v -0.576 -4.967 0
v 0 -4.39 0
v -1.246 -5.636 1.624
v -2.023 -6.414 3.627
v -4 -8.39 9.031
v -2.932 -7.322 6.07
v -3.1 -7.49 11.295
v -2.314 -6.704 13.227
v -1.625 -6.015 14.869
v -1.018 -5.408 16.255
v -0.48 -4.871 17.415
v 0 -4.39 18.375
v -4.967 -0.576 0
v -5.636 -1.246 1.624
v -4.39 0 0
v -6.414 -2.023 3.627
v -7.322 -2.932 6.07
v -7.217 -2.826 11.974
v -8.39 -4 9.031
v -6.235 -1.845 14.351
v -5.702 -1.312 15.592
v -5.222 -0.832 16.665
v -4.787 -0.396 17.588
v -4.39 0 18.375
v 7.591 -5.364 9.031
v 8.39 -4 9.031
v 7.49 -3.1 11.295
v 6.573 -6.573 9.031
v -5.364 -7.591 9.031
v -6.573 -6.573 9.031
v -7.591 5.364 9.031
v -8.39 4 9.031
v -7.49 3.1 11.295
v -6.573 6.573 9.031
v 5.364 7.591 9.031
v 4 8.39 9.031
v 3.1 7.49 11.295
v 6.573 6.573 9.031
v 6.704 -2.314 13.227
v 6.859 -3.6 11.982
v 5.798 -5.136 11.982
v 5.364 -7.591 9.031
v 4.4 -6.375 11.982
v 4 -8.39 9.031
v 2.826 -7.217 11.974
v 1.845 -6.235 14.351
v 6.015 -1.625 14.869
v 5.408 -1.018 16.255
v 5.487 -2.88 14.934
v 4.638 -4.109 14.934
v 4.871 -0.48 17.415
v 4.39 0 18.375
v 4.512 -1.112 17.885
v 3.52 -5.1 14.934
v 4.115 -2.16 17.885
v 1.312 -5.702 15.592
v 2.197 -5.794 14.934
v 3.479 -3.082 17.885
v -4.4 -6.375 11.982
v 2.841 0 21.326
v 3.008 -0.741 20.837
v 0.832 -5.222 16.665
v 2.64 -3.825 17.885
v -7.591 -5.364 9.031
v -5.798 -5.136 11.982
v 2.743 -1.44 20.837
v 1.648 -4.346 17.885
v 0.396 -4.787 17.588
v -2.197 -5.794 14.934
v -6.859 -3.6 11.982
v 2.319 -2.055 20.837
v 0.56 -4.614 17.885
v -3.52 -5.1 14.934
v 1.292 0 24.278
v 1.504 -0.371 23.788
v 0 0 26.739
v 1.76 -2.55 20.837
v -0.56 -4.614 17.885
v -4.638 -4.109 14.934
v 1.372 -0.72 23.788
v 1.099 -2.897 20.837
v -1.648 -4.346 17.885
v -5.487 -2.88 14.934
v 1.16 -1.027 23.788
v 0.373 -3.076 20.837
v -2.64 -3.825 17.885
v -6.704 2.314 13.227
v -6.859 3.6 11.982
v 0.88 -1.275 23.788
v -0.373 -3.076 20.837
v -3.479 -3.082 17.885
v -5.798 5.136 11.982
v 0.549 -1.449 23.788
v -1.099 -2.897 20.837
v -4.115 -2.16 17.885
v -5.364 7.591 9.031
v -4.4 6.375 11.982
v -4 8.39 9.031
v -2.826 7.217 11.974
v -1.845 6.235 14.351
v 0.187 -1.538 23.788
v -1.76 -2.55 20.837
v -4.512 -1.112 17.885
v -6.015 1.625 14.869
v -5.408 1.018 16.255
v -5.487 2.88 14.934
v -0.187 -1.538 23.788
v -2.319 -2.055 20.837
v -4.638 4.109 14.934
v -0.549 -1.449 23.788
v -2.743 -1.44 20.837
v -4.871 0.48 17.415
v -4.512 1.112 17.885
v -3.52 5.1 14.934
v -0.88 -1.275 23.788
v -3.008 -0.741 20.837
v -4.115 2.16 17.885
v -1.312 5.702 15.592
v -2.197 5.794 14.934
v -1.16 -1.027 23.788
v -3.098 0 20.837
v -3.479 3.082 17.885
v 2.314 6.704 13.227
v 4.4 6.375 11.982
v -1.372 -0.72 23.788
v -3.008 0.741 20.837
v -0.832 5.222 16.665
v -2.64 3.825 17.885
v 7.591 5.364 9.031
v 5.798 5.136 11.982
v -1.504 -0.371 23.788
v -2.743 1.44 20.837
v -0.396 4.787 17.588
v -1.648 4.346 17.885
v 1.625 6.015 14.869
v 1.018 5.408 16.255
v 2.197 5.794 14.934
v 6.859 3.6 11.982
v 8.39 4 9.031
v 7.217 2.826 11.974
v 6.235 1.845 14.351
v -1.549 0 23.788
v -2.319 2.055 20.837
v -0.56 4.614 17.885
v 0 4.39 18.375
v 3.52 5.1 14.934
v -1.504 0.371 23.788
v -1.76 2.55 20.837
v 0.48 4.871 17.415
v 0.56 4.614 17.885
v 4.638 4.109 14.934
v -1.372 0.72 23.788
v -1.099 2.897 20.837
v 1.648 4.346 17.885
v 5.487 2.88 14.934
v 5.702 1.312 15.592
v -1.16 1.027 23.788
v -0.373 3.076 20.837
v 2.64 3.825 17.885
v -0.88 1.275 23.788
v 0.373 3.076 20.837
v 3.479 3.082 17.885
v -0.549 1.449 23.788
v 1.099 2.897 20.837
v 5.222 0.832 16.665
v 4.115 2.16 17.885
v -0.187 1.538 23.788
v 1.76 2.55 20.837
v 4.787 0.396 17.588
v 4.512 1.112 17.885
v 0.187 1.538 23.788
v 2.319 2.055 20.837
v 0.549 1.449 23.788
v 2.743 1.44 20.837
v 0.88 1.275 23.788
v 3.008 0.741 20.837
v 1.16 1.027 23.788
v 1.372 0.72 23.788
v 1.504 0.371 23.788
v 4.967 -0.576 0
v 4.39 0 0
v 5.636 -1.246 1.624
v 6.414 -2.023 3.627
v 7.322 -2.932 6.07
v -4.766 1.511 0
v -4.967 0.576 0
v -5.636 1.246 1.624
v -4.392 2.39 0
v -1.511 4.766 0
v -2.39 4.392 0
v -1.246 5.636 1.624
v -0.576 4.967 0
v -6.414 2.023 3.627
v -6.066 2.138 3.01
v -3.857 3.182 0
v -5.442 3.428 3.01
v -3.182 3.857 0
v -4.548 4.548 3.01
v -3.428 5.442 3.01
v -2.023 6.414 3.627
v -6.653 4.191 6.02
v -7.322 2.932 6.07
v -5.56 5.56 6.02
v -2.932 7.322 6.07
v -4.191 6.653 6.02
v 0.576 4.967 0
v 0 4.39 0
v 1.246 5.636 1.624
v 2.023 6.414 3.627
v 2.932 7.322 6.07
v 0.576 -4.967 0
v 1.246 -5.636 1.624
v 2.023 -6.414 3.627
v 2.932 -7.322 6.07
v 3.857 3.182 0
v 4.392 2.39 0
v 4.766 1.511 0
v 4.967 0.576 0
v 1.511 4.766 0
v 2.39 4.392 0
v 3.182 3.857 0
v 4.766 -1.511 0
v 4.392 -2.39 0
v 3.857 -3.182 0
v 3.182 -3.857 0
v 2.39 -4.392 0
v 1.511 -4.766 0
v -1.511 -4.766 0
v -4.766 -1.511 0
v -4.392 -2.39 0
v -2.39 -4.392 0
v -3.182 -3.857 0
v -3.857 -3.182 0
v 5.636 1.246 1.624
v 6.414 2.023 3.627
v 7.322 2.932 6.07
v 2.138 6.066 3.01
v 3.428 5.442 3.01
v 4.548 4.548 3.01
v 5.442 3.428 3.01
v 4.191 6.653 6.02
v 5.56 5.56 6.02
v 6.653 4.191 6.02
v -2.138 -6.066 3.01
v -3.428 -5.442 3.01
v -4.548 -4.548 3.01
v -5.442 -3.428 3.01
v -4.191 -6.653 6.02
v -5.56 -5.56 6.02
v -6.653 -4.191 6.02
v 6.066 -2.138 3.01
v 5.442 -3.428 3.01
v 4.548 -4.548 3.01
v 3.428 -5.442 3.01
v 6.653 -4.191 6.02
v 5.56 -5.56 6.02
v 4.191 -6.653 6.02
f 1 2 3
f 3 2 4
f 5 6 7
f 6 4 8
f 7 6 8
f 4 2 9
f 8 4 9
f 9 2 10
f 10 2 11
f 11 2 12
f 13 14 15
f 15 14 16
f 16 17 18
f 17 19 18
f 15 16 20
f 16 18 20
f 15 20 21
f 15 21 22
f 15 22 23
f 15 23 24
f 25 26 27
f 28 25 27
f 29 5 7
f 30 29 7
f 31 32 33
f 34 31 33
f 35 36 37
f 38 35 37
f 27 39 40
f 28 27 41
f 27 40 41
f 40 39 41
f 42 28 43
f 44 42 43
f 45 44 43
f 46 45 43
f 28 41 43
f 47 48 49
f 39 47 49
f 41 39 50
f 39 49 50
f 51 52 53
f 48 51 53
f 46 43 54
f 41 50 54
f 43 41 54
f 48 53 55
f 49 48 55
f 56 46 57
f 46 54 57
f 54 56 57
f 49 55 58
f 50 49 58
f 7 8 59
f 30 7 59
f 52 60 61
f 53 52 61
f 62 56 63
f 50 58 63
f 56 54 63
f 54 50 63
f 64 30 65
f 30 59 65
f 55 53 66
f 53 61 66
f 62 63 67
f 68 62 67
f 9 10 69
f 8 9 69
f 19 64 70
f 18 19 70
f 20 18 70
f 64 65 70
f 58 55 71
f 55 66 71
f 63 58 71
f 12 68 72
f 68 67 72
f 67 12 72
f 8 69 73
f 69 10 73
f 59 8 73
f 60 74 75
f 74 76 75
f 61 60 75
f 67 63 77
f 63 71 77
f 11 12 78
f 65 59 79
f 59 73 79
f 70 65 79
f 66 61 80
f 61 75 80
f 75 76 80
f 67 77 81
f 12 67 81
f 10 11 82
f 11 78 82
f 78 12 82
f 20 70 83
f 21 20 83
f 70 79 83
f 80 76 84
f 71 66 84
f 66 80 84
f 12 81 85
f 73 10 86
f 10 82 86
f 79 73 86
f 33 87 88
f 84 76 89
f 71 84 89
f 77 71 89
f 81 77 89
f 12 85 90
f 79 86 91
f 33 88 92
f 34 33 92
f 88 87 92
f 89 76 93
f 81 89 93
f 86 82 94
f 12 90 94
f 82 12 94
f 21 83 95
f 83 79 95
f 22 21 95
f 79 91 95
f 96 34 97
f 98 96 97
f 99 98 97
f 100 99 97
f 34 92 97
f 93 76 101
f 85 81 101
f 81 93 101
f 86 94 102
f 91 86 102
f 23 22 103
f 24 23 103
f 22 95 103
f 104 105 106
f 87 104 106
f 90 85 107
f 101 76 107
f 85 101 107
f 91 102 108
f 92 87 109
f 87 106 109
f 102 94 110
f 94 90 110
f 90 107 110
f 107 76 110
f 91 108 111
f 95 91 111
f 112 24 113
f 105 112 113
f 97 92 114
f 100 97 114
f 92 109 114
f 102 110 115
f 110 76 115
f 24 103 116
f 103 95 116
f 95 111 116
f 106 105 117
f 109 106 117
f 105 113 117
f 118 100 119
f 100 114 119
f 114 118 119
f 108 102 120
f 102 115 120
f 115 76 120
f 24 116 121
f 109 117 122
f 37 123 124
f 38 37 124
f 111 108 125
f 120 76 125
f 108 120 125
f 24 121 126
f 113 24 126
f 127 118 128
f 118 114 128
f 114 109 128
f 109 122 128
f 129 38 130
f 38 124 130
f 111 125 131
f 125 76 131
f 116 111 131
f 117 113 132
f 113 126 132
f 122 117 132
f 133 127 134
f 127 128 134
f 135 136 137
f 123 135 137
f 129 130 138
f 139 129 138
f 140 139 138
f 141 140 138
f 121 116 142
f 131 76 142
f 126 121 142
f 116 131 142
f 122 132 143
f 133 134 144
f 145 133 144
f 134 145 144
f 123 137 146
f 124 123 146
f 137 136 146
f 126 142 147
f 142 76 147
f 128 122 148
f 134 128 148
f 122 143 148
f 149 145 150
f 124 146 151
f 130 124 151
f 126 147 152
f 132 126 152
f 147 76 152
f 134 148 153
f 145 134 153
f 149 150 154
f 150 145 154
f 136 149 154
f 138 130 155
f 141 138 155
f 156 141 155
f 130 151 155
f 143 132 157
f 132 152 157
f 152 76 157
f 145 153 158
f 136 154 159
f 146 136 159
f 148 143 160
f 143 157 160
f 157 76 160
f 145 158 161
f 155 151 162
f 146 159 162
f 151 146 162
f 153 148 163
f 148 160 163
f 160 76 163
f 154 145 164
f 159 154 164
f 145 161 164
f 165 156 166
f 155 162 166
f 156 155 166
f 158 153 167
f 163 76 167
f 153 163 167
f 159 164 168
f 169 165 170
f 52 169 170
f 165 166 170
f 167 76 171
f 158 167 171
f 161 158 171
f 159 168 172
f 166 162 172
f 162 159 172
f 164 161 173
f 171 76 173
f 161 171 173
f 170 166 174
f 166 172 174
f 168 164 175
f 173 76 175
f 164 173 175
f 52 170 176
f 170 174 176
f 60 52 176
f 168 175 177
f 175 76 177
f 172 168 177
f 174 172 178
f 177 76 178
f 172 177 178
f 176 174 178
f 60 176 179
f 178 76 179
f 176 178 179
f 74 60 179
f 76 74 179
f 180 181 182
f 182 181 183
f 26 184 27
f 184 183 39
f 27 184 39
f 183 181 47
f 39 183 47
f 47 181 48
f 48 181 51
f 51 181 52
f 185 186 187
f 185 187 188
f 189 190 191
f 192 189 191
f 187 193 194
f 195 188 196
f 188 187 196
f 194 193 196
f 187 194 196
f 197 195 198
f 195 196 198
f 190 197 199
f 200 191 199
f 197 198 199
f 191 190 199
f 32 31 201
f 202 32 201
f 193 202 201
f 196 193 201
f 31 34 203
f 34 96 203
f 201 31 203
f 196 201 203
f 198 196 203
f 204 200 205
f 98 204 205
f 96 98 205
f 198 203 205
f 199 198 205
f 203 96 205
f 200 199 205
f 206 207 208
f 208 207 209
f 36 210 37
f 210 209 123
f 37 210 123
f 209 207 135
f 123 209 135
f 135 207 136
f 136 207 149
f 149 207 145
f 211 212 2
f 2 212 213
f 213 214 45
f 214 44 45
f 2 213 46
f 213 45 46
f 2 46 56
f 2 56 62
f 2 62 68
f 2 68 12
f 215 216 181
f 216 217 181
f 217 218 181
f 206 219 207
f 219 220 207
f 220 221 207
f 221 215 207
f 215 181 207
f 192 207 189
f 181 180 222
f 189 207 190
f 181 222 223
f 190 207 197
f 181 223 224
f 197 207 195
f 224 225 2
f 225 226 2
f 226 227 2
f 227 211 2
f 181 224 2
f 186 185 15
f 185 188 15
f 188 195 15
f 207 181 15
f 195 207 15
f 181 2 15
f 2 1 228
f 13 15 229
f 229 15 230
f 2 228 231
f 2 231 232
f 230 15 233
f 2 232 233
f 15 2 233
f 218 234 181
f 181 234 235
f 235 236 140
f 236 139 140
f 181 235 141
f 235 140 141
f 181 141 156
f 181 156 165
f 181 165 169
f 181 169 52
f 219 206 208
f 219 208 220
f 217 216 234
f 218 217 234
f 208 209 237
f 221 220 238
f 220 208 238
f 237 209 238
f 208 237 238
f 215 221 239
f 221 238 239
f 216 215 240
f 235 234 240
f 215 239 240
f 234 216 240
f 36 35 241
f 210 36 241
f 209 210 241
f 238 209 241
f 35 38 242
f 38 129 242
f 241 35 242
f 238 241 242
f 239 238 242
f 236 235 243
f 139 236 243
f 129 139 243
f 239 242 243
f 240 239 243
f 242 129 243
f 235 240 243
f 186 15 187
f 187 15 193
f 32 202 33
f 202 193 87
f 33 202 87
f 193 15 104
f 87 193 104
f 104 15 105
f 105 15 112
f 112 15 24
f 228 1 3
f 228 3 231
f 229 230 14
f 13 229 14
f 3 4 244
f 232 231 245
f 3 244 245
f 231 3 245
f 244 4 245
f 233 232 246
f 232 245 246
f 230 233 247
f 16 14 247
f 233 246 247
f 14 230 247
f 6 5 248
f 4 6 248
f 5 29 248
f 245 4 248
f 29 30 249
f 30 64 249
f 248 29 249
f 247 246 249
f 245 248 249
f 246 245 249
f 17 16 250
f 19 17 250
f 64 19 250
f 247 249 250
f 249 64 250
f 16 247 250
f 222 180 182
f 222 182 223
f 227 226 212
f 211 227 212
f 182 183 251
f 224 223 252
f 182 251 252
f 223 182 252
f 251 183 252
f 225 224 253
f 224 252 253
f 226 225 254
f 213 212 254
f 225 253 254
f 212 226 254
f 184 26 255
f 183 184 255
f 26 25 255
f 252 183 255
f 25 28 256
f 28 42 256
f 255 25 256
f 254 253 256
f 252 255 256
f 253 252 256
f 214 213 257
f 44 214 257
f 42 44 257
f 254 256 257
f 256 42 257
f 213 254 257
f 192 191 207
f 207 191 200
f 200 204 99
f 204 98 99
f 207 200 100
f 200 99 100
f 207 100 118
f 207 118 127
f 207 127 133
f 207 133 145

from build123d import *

# Parameters (mm, degrees)
F4_DEPTH = 26.7404350513


with BuildPart() as f1:
    # F0 (on Front) → F1 (revolve)
    with BuildSketch(Plane.XZ):
        Polygon((5, 0), (9.295072388, 9.0306341517), (0, 26.7394350513), (0, 0), align=None)
    revolve(axis=Axis((0, 0, -4.4079385259), (0, 0, -1)))

    # F3 (on face) → F4 (cut, through all)
    with BuildSketch(Plane.XY.offset(26.7394350513)):
        with BuildLine():
            ThreePointArc((9.295072388, 0), (9.0660769225, 2.0505169915), (8.3903736924, 4))
            Line((8.3903736924, 4), (4.3903736924, 0))
            Line((4.3903736924, 0), (8.3903736924, -4))
            ThreePointArc((8.3903736924, -4), (9.0660769225, -2.0505169915), (9.295072388, 0))
        make_face()
        with BuildLine():
            ThreePointArc((4, 8.3903736924), (0, 9.295072388), (-4, 8.3903736924))
            Line((-4, 8.3903736924), (0, 4.3903736924))
            Line((0, 4.3903736924), (4, 8.3903736924))
        make_face()
        with BuildLine():
            Line((-4.3903736924, 0), (-8.3903736924, 4))
            ThreePointArc((-8.3903736924, 4), (-9.295072388, 0), (-8.3903736924, -4))
            Line((-8.3903736924, -4), (-4.3903736924, 0))
        make_face()
        with BuildLine():
            Line((0, -4.3903736924), (-4, -8.3903736924))
            ThreePointArc((-4, -8.3903736924), (0, -9.295072388), (4, -8.3903736924))
            Line((4, -8.3903736924), (0, -4.3903736924))
        make_face()
    extrude(amount=-F4_DEPTH, mode=Mode.SUBTRACT)


solid = f1.part
